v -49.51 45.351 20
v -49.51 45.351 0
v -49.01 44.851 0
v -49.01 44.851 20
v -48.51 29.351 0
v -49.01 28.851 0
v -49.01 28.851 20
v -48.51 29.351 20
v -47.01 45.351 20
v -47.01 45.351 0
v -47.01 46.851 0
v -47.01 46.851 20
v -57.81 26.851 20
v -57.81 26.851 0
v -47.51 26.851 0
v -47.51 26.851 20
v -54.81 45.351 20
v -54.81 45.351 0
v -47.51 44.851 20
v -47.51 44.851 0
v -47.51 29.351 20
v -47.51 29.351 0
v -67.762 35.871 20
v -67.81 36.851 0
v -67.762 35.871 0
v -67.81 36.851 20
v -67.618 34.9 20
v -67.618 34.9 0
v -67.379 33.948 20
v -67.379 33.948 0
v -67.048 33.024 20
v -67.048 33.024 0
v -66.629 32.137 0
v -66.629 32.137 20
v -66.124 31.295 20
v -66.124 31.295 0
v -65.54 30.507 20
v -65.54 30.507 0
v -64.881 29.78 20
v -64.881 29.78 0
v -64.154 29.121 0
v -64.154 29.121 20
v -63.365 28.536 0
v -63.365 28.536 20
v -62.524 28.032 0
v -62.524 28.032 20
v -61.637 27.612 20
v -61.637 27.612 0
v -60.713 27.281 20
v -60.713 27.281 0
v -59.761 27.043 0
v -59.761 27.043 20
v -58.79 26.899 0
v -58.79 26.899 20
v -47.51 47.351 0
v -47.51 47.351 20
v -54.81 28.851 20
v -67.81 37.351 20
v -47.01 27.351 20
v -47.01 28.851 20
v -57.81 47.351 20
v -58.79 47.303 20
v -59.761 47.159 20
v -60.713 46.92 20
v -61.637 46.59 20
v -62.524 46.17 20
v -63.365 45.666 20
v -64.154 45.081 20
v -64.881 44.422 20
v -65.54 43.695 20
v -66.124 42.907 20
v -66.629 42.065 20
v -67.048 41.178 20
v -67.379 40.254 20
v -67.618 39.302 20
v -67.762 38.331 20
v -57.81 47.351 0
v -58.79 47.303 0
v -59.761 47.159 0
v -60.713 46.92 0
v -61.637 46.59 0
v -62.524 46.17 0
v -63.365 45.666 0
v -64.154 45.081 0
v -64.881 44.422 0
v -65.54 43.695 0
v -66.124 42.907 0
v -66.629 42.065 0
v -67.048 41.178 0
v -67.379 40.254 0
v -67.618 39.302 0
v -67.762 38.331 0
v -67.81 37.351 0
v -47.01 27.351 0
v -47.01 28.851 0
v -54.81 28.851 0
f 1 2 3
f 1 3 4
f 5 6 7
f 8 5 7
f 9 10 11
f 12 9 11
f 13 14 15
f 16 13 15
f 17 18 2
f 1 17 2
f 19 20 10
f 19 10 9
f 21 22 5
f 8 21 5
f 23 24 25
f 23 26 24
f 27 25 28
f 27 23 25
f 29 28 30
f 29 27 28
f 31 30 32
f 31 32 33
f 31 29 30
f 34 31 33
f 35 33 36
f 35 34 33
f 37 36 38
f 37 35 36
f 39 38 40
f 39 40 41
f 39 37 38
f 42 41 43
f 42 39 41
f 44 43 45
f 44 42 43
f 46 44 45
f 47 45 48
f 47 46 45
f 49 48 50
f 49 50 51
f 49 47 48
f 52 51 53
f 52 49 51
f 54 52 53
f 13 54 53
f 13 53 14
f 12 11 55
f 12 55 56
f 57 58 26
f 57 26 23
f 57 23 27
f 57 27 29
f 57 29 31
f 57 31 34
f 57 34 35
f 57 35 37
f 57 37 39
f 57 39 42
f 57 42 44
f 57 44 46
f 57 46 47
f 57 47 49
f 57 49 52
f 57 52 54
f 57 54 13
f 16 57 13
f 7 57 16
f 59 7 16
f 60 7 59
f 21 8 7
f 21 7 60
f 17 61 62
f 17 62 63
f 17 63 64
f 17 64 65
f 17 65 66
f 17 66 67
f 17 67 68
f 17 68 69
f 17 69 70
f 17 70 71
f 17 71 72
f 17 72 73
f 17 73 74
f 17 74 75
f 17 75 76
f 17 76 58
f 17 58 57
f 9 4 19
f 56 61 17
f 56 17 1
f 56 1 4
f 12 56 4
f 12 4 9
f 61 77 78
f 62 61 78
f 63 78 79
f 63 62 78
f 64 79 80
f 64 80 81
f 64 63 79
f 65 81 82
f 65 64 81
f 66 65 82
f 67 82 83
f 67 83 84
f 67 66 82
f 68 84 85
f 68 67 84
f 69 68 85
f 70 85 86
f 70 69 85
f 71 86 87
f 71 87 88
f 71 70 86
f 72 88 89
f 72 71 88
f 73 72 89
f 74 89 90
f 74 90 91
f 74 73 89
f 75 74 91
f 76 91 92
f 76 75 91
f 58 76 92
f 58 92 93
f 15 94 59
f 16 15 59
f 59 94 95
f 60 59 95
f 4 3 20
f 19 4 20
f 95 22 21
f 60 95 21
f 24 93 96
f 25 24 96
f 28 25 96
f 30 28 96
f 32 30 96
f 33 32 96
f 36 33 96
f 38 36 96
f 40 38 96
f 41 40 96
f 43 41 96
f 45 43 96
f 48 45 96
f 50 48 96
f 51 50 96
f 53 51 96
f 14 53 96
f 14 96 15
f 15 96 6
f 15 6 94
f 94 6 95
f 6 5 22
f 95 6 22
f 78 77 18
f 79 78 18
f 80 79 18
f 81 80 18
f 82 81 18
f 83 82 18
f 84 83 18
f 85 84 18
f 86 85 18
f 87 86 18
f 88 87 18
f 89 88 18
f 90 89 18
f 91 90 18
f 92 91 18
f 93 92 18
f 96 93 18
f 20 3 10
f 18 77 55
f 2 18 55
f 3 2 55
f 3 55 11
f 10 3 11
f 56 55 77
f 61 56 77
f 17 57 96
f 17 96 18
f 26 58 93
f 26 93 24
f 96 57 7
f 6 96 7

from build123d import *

# Parameters (mm, degrees)
F0_W     = 5.8
F0_H     = 2
F1_DEPTH = 20
F2_R     = 10
F3_SIZE  = 0.49999


# Not quite as in the source:
# - a fillet or chamfer is up to 0.001 mm smaller than in the source, because OpenCascade refuses the exact size


with BuildPart() as f1:
    # F0 (on Top) → F1 (new body)
    with BuildSketch(Plane.XY):
        with Locations((-51.9097009659, 46.350823313)):
            Rectangle(F0_W, F0_H)
        Polygon((-54.8097009659, 45.350823313), (-54.8097009659, 47.350823313), (-67.8097009659, 47.350823313), (-67.8097009659, 26.850823313), (-54.8097009659, 26.850823313), (-54.8097009659, 28.850823313), align=None)
        Polygon((-47.0097009659, 47.350823313), (-49.0097009659, 47.350823313), (-49.0097009659, 45.350823313), (-49.0097009659, 44.850823313), (-47.0097009659, 44.850823313), align=None)
        with Locations((-51.9097009659, 27.850823313)):
            Rectangle(F0_W, F0_H)
        Polygon((-49.0097009659, 29.350823313), (-49.0097009659, 28.850823313), (-49.0097009659, 26.850823313), (-47.0097009659, 26.850823313), (-47.0097009659, 29.350823313), align=None)
    extrude(amount=F1_DEPTH)

    # F2
    f2_edges = [f1.edges().sort_by_distance(p)[0] for p in [
        (-67.809701, 47.350823, 10),
        (-67.809701, 26.850823, 10),
    ]]
    fillet(f2_edges, radius=F2_R)

    # F3 (size 0.5 in the source; OpenCascade refuses exactly that, so slightly less here)
    f3_edges = [f1.edges().sort_by_distance(p)[0] for p in [
        (-47.009701, 47.350823, 10),
        (-47.009701, 44.850823, 10),
        (-47.009701, 29.350823, 10),
        (-47.009701, 26.850823, 10),
        (-49.009701, 29.350823, 10),
        (-49.009701, 45.350823, 10),
    ]]
    chamfer(f3_edges, length=F3_SIZE)


solid = f1.part
